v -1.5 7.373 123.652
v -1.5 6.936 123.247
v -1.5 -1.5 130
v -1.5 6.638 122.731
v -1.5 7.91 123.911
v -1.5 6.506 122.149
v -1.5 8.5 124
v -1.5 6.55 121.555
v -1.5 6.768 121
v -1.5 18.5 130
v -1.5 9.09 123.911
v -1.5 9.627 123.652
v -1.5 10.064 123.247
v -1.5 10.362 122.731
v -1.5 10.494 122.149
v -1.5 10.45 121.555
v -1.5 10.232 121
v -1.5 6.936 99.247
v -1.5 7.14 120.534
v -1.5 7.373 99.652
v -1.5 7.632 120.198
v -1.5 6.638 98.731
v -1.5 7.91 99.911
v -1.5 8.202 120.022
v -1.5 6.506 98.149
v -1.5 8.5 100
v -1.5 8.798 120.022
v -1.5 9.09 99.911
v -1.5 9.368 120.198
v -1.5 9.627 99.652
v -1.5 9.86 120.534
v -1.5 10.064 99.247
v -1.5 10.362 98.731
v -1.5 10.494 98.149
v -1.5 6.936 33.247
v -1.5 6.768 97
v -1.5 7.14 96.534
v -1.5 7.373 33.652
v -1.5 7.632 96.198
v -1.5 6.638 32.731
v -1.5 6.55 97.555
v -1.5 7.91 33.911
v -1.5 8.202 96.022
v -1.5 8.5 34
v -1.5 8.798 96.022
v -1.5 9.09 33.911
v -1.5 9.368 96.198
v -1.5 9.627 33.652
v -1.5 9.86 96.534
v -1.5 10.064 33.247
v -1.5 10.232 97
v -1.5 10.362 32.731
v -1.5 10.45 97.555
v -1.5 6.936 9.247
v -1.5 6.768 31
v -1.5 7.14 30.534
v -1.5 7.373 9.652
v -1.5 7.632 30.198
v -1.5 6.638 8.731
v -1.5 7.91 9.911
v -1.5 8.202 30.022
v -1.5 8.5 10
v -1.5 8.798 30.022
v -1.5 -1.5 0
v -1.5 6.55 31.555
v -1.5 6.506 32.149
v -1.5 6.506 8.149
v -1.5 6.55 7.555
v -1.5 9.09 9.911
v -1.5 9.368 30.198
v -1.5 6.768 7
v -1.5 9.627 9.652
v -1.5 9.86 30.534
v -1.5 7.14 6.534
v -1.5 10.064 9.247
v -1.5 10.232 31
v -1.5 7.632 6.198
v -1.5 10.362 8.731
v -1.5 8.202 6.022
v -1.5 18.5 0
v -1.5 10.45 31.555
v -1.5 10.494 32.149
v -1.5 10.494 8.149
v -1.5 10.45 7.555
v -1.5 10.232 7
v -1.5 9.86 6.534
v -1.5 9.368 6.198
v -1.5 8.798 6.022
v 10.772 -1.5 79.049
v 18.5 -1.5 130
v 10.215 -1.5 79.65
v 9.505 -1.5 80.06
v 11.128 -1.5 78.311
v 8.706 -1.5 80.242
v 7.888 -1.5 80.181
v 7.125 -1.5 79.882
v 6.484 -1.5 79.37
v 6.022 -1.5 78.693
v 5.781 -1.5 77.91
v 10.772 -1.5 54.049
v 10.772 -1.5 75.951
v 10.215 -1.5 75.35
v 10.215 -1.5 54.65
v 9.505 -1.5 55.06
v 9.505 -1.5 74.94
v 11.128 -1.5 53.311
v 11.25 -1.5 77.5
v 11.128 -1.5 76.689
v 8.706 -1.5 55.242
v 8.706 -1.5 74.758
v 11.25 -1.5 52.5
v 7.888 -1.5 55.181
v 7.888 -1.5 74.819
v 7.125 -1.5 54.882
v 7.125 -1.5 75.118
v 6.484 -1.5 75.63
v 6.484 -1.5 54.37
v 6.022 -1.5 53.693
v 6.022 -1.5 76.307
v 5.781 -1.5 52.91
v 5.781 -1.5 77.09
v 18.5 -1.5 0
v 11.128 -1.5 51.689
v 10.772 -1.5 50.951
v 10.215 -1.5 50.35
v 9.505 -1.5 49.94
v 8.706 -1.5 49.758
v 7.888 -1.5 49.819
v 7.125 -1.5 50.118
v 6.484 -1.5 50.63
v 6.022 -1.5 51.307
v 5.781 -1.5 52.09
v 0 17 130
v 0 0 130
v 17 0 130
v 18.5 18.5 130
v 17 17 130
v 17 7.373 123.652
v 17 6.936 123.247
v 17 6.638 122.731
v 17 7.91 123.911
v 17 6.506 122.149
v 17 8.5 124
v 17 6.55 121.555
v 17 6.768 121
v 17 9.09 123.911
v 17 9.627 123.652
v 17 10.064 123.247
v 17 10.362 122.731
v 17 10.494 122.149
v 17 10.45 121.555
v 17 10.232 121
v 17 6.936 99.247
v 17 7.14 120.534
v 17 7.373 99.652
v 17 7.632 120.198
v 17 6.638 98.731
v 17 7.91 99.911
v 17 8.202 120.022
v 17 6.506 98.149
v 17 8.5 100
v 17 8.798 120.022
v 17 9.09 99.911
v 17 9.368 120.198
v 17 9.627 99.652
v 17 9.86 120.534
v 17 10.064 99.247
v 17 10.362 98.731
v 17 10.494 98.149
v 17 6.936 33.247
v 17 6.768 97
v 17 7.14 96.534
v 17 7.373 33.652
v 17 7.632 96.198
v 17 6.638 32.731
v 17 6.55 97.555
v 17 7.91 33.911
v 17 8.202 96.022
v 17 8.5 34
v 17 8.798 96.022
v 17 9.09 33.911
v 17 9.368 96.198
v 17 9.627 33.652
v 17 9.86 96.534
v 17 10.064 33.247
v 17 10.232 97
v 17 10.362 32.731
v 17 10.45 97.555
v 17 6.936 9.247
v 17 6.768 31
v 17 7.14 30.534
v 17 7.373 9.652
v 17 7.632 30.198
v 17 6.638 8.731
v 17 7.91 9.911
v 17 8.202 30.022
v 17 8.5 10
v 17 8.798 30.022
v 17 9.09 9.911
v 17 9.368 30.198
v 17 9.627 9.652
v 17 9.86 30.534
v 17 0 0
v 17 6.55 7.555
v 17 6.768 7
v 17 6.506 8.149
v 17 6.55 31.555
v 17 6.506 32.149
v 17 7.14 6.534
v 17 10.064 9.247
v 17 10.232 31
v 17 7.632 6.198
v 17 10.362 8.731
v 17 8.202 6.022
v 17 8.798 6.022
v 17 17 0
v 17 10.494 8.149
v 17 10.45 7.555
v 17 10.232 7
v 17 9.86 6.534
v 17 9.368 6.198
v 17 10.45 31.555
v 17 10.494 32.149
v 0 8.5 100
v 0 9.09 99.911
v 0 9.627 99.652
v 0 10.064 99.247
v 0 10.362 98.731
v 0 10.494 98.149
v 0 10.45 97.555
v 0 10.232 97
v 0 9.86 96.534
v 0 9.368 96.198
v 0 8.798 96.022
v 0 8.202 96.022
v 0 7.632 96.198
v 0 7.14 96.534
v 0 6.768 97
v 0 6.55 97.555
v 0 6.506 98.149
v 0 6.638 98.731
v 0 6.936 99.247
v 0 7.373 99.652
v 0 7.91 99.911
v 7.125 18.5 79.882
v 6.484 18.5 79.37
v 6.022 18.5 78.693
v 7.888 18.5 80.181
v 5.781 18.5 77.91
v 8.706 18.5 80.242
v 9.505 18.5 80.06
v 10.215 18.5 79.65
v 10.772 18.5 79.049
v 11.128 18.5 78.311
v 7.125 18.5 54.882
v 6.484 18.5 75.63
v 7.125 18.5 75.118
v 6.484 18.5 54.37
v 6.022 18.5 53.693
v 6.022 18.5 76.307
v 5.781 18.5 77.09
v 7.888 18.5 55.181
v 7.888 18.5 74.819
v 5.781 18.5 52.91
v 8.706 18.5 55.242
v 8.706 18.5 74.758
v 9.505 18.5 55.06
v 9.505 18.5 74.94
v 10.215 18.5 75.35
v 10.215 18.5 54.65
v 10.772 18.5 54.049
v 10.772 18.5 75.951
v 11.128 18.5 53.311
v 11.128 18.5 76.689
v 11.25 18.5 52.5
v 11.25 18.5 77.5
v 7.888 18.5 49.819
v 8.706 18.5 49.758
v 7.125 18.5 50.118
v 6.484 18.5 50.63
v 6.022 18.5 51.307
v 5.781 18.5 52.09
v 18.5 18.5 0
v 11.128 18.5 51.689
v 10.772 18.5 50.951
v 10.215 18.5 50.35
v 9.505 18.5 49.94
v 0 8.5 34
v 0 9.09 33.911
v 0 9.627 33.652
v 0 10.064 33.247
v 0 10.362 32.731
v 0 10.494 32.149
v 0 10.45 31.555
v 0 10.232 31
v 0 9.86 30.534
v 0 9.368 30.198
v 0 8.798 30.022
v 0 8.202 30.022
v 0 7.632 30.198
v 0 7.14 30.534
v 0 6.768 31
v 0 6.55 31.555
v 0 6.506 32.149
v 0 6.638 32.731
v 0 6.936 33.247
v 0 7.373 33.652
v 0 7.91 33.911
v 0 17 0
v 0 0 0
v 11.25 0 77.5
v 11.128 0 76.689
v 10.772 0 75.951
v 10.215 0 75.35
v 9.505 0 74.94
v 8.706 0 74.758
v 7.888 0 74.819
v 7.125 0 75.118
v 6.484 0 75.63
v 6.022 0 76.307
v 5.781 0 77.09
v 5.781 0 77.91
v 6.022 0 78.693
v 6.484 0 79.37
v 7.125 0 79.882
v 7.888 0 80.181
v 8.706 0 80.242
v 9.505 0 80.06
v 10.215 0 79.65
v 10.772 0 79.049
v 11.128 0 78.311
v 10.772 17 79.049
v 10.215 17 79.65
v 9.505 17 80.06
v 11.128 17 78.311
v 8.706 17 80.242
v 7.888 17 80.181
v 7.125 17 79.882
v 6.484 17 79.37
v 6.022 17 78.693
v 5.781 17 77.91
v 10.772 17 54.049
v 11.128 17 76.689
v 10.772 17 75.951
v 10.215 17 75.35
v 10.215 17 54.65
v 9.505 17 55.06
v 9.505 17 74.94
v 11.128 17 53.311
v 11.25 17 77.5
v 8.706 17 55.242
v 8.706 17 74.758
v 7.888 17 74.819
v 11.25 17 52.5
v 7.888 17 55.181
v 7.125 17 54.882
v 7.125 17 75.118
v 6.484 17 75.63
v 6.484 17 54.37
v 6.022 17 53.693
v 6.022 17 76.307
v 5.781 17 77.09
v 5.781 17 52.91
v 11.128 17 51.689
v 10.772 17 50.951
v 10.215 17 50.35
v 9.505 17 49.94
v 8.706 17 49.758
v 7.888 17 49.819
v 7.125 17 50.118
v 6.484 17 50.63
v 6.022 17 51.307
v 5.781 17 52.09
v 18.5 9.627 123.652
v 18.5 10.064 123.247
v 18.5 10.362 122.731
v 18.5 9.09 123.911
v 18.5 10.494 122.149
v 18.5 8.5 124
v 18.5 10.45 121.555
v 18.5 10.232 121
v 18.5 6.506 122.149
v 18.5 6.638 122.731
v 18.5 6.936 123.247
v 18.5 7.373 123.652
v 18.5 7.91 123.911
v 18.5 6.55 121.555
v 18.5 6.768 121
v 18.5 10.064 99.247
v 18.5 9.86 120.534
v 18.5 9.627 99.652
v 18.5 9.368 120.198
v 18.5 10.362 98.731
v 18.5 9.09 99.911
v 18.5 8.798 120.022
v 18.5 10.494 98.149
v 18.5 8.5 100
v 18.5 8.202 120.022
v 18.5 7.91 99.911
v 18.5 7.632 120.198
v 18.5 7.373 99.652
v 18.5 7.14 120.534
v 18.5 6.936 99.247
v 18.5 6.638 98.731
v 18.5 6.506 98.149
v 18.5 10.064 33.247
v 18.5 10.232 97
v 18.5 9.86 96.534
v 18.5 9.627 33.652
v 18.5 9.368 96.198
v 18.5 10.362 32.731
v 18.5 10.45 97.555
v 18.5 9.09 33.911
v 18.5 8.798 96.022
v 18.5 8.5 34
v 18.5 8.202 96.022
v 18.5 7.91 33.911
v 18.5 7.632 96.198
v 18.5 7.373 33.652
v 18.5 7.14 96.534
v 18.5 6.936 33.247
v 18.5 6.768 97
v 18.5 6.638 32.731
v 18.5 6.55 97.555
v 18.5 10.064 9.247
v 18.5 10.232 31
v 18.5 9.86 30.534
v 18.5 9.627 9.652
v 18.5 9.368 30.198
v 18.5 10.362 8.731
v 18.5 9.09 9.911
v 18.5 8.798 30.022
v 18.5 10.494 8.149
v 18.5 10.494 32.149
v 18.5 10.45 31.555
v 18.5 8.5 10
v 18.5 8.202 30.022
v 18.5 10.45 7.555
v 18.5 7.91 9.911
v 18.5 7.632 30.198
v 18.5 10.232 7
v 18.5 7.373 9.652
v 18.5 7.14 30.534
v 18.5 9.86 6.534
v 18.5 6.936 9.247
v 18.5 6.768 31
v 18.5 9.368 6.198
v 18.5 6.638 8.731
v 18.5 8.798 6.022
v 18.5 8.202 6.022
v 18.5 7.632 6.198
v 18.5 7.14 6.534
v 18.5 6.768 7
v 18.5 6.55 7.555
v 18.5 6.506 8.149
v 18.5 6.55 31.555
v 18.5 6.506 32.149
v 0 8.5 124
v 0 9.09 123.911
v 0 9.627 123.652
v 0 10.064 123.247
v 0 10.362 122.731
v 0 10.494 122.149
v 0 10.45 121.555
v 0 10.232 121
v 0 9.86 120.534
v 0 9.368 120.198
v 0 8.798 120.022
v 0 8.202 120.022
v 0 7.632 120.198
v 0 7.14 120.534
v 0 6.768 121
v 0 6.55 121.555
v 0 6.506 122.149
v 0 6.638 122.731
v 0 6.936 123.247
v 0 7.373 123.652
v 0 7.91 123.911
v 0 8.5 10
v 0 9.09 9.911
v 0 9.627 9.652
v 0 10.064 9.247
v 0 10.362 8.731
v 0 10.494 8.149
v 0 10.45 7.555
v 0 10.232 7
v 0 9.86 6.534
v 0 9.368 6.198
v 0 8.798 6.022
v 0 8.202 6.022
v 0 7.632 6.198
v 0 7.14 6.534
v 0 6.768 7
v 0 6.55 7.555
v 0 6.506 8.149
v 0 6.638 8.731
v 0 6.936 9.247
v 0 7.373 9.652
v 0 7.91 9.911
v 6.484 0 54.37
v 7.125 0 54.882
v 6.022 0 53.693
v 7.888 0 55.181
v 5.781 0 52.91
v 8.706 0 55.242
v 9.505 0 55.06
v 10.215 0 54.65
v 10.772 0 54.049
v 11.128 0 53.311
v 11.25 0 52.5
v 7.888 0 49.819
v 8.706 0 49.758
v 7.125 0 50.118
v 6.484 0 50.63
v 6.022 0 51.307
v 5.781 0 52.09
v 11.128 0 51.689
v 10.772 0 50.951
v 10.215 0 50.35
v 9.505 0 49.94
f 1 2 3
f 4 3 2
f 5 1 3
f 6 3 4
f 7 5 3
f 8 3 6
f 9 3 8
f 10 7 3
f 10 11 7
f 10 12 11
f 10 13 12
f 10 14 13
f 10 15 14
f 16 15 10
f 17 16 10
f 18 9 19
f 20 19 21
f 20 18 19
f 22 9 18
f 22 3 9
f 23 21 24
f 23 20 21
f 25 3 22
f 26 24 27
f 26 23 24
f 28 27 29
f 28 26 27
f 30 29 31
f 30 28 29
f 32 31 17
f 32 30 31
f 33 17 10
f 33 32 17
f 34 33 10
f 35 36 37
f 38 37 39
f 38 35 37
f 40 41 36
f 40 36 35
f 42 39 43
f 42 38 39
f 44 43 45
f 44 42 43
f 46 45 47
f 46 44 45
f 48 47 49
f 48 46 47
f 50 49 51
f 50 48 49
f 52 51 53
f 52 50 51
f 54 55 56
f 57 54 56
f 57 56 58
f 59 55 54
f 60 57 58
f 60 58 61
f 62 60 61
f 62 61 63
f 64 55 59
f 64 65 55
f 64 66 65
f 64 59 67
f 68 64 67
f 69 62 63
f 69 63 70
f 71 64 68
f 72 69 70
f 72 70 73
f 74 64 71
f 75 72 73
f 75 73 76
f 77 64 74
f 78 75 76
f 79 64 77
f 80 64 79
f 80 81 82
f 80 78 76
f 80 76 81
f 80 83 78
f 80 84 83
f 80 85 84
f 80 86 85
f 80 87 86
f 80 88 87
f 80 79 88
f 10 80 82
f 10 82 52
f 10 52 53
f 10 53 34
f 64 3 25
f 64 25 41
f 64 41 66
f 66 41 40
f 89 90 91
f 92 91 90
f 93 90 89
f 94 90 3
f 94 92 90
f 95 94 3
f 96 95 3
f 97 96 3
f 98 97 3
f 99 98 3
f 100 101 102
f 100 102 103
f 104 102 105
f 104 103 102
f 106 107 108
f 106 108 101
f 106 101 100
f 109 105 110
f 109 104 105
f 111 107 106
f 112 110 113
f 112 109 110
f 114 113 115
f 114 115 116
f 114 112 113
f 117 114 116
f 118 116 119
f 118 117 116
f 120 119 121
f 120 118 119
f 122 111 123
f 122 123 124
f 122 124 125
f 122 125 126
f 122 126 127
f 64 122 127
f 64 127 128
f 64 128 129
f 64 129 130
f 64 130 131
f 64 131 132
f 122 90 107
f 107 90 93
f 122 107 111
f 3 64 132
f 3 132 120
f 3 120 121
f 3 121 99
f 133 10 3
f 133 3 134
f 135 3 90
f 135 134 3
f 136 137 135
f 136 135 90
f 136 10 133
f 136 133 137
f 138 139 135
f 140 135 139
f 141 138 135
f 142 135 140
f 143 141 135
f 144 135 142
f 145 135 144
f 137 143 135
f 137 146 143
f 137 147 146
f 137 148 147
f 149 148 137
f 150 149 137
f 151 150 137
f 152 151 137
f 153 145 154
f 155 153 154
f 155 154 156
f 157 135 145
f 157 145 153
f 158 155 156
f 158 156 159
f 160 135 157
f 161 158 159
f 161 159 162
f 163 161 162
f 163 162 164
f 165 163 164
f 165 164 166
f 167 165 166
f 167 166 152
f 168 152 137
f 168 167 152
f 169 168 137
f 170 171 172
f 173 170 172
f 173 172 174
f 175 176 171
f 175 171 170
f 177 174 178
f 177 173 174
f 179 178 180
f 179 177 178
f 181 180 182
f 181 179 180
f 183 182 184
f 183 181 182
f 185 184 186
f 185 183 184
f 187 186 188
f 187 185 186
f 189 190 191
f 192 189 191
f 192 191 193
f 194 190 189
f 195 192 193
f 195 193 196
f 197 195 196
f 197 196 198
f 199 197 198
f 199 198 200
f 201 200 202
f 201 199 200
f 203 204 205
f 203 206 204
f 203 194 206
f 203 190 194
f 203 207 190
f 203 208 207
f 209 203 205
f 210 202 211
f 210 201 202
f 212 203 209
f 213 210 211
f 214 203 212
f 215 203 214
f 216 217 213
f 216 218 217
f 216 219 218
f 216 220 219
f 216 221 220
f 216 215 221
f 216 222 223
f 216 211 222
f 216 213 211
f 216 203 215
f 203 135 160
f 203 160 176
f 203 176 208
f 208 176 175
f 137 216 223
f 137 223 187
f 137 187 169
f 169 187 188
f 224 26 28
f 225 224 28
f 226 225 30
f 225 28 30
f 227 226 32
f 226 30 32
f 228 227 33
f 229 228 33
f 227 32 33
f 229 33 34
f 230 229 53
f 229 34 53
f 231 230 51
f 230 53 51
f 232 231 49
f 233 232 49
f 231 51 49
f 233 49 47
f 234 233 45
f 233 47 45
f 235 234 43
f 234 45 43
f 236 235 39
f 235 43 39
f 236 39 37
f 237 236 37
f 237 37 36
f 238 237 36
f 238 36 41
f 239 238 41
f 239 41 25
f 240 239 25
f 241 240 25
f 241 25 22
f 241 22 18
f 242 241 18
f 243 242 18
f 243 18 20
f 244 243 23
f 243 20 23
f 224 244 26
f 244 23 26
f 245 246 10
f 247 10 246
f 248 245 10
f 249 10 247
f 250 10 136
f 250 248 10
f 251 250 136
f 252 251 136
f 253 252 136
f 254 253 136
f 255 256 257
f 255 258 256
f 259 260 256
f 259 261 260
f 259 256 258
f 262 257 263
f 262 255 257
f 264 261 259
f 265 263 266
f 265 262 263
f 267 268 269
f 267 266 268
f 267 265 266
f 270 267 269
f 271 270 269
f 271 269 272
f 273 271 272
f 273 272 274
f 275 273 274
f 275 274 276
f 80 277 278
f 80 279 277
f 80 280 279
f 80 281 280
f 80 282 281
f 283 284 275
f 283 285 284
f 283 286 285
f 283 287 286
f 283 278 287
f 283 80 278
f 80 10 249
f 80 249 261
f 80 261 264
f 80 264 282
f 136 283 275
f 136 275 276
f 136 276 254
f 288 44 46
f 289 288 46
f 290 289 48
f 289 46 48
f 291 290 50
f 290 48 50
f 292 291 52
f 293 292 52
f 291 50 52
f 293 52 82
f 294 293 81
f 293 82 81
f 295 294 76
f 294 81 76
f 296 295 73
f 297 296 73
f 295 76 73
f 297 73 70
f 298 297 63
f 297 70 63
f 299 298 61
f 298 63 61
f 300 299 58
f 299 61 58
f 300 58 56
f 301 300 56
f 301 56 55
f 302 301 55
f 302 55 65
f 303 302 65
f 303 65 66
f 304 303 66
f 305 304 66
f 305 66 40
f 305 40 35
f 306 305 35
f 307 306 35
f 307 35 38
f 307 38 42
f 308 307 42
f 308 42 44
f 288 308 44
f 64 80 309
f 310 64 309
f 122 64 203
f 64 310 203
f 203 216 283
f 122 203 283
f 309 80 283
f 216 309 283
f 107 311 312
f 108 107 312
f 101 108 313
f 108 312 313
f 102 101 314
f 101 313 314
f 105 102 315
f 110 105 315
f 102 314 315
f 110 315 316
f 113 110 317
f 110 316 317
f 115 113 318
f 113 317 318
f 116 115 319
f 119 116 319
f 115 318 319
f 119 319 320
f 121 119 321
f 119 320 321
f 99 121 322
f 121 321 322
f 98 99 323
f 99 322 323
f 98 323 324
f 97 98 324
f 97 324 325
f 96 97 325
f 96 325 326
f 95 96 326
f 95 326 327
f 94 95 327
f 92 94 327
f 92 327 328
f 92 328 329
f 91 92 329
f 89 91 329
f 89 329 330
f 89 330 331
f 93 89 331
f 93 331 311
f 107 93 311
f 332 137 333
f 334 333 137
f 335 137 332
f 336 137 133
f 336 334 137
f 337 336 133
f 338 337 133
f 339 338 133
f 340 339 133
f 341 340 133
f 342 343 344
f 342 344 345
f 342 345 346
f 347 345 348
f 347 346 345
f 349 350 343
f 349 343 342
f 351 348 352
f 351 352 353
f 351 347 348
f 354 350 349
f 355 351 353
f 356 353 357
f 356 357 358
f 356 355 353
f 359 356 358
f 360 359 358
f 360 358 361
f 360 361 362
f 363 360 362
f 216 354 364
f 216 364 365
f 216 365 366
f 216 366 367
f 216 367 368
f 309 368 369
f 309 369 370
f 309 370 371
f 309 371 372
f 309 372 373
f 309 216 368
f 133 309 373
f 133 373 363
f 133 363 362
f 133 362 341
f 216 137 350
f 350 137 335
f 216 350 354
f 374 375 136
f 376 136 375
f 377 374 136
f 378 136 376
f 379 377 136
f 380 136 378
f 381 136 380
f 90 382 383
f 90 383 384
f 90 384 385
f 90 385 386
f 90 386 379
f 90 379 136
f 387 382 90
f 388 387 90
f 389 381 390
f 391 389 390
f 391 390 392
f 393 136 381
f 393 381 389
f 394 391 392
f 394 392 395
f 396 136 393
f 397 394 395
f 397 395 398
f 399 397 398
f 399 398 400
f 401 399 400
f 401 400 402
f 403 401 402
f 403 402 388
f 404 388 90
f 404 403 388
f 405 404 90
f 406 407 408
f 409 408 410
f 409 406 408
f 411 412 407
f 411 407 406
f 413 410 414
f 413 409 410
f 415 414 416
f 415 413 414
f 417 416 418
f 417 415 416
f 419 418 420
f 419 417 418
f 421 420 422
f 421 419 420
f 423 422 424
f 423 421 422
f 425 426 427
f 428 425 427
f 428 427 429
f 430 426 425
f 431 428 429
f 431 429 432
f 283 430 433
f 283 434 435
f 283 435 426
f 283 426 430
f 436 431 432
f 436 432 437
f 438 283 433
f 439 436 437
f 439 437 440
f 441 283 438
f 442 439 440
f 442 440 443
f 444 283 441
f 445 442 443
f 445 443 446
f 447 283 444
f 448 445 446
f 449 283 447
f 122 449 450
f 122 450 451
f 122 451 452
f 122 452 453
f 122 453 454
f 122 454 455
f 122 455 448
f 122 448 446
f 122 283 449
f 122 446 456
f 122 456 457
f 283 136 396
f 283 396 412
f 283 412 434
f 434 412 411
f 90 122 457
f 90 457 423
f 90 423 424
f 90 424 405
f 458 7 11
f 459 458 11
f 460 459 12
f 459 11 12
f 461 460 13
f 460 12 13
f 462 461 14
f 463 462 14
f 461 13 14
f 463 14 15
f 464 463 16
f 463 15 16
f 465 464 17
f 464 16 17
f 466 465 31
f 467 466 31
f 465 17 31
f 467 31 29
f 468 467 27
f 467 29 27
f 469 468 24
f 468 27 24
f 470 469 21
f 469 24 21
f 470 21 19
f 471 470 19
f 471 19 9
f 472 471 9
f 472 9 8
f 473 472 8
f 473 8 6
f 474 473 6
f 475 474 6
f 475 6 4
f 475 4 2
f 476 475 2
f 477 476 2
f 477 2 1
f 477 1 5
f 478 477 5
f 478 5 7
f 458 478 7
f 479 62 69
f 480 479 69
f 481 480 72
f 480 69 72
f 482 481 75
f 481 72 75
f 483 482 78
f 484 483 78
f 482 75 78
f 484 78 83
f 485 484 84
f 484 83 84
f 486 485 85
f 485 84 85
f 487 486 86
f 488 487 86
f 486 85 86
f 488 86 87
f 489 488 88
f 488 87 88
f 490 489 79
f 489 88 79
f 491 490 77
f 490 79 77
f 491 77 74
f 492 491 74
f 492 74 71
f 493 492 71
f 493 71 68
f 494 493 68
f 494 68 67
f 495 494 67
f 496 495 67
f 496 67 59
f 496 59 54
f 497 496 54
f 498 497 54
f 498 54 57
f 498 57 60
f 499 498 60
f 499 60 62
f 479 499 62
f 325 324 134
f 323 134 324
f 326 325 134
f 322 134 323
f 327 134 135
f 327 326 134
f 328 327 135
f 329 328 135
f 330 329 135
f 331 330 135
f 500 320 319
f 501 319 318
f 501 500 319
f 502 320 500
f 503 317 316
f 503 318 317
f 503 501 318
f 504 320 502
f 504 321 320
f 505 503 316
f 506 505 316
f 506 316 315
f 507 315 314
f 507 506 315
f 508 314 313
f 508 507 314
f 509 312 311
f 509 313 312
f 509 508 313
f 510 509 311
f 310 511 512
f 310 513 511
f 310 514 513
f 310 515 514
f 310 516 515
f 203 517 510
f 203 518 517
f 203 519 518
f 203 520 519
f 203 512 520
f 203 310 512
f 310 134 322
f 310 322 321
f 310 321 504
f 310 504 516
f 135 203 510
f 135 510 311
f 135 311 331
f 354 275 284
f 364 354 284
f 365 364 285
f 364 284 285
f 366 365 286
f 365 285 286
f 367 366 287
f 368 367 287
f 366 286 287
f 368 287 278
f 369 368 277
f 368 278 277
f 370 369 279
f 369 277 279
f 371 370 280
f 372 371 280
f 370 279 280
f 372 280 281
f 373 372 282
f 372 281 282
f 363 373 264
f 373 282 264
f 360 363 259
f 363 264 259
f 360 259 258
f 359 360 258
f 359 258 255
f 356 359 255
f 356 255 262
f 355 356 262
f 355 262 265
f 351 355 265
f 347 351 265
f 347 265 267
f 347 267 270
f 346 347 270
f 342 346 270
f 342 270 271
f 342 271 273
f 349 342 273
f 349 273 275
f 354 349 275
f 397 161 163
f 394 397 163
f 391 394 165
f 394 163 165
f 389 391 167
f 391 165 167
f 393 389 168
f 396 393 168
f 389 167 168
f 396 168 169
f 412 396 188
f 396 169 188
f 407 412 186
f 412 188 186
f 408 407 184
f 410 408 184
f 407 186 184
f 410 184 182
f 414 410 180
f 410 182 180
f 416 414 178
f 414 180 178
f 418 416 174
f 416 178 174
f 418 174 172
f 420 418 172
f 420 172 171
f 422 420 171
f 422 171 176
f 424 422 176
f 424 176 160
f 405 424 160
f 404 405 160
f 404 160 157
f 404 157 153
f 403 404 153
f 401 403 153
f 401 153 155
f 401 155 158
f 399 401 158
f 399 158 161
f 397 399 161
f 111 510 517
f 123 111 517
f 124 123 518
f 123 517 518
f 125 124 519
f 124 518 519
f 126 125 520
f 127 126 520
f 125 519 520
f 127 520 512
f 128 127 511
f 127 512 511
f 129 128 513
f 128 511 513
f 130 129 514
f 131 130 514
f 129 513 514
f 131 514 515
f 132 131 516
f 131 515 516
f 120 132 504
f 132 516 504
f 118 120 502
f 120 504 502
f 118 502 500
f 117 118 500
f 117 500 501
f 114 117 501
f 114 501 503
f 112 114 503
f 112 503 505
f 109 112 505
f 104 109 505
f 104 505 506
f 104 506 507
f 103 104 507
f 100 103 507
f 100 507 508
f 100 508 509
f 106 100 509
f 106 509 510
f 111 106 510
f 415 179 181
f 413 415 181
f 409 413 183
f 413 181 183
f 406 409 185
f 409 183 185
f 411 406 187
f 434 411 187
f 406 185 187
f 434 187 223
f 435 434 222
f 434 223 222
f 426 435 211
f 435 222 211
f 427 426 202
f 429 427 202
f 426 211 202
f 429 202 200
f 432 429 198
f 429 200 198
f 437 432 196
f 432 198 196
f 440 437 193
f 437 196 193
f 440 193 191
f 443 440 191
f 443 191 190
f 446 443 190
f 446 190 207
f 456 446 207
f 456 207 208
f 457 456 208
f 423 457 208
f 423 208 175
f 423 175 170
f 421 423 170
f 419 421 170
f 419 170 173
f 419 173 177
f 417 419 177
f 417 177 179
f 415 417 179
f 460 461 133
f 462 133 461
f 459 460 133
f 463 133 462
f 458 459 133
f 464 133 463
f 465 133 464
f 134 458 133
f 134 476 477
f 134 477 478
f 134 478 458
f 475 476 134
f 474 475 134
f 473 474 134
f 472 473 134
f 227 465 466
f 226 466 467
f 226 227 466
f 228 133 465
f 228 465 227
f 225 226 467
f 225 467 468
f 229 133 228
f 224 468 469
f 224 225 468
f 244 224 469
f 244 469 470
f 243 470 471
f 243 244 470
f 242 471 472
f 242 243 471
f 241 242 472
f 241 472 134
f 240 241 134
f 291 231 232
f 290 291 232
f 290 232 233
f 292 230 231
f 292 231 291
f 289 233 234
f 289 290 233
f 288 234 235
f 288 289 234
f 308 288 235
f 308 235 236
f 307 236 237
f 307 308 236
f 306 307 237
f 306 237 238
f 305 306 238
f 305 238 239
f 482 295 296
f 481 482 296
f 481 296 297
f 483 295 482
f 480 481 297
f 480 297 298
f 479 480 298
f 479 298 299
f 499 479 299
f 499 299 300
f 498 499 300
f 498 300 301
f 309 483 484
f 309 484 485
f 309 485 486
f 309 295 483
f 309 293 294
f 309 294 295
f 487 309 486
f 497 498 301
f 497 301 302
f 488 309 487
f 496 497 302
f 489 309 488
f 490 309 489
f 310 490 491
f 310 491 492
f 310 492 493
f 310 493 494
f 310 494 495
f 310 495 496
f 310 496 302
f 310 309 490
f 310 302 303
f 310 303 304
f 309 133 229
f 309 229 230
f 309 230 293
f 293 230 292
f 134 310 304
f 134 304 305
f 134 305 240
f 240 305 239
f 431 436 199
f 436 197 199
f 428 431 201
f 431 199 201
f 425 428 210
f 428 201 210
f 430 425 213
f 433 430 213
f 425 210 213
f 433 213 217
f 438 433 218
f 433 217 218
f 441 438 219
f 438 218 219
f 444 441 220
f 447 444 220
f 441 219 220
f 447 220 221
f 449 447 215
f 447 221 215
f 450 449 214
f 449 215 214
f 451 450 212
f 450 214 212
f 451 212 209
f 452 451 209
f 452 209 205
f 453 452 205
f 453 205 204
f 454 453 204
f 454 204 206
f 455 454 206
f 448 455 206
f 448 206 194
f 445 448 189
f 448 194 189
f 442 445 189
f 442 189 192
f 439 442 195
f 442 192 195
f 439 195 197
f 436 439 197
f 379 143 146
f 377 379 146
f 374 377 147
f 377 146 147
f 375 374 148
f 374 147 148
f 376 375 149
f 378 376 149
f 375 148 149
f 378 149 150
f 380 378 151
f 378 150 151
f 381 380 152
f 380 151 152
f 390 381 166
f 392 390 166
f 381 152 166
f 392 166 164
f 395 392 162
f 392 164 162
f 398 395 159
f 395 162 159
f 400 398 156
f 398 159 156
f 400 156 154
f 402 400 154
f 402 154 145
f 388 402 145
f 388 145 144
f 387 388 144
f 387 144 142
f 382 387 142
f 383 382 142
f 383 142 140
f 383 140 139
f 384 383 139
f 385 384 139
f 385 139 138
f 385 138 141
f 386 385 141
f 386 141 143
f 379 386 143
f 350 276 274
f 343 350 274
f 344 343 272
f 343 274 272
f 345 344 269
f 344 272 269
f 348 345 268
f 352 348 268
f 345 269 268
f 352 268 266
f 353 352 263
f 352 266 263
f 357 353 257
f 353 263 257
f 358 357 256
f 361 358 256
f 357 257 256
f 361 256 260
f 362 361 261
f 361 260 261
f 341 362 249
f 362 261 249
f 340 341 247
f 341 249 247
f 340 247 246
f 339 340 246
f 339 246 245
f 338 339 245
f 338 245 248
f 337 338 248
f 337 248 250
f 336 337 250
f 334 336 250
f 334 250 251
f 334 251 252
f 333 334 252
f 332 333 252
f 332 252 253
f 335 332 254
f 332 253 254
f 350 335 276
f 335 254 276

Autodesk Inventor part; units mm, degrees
ref_plane "YZ Plane" through (0, 0, 0) normal (1, 0, 0) x (0, 1, 0)
ref_plane "XZ Plane" through (0, 0, 0) normal (0, 1, 0) x (-1, 0, 0)
ref_plane "XY Plane" through (0, 0, 0) normal (0, 0, 1) x (1, 0, 0)
sketch "Эскиз1" plane through (0, 0, 0) normal (0, 0, 1) x (1, 0, 0)
  line L0 (0, 0) -> (17, 0)
  line L1 (17, 0) -> (17, 17)
  line L2 (17, 17) -> (0, 17)
  line L3 (0, 17) -> (0, 0)
  line L4 (-1.5, 18.5) -> (18.5, 18.5)
  line L5 (18.5, 18.5) -> (18.5, -1.5)
  line L6 (18.5, -1.5) -> (-1.5, -1.5)
  line L7 (-1.5, -1.5) -> (-1.5, 18.5)
  dimension "d0" = 20
  dimension "d1" = 1.5
extrude "Выдавливание1" add sketch "Эскиз1" along normal blind 130
sketch "Эскиз2" plane through (-1.5, 18.5, 0) normal (0, 1, 0) x (1, 0, 0)
  line L0 (20, -130) -> (0, -130) construction
  line L1 (20, 0) -> (0, 0) construction
  line L2 (20, 0) -> (20, -130) construction
  circle A0 centre (10, -52.5) radius 2.75
  circle A1 centre (10, -77.5) radius 2.75
  line L3 (10, -77.5) -> (10, -52.5) construction
  point P0 (1.5, 0)
  point P1 (10, -65)
  point P2 (20, -65)
  point P3 (10, 0)
  dimension "d4" = 25
  dimension "d5" = 5.5
extrude "Выдавливание2" cut sketch "Эскиз2" against normal through all
sketch "Эскиз3" plane through (-1.5, -1.5, 0) normal (-1, 0, 0) x (0, 0, 1)
  circle A0 centre (8, 10) radius 2 projected
  circle A1 centre (32, 10) radius 2 projected
  circle A2 centre (98, 10) radius 2 projected
  circle A3 centre (122, 10) radius 2 projected
  point P0 (0, 1.5)
extrude "Выдавливание3" cut sketch "Эскиз3" against normal blind 200
properties part number "side_axis"
